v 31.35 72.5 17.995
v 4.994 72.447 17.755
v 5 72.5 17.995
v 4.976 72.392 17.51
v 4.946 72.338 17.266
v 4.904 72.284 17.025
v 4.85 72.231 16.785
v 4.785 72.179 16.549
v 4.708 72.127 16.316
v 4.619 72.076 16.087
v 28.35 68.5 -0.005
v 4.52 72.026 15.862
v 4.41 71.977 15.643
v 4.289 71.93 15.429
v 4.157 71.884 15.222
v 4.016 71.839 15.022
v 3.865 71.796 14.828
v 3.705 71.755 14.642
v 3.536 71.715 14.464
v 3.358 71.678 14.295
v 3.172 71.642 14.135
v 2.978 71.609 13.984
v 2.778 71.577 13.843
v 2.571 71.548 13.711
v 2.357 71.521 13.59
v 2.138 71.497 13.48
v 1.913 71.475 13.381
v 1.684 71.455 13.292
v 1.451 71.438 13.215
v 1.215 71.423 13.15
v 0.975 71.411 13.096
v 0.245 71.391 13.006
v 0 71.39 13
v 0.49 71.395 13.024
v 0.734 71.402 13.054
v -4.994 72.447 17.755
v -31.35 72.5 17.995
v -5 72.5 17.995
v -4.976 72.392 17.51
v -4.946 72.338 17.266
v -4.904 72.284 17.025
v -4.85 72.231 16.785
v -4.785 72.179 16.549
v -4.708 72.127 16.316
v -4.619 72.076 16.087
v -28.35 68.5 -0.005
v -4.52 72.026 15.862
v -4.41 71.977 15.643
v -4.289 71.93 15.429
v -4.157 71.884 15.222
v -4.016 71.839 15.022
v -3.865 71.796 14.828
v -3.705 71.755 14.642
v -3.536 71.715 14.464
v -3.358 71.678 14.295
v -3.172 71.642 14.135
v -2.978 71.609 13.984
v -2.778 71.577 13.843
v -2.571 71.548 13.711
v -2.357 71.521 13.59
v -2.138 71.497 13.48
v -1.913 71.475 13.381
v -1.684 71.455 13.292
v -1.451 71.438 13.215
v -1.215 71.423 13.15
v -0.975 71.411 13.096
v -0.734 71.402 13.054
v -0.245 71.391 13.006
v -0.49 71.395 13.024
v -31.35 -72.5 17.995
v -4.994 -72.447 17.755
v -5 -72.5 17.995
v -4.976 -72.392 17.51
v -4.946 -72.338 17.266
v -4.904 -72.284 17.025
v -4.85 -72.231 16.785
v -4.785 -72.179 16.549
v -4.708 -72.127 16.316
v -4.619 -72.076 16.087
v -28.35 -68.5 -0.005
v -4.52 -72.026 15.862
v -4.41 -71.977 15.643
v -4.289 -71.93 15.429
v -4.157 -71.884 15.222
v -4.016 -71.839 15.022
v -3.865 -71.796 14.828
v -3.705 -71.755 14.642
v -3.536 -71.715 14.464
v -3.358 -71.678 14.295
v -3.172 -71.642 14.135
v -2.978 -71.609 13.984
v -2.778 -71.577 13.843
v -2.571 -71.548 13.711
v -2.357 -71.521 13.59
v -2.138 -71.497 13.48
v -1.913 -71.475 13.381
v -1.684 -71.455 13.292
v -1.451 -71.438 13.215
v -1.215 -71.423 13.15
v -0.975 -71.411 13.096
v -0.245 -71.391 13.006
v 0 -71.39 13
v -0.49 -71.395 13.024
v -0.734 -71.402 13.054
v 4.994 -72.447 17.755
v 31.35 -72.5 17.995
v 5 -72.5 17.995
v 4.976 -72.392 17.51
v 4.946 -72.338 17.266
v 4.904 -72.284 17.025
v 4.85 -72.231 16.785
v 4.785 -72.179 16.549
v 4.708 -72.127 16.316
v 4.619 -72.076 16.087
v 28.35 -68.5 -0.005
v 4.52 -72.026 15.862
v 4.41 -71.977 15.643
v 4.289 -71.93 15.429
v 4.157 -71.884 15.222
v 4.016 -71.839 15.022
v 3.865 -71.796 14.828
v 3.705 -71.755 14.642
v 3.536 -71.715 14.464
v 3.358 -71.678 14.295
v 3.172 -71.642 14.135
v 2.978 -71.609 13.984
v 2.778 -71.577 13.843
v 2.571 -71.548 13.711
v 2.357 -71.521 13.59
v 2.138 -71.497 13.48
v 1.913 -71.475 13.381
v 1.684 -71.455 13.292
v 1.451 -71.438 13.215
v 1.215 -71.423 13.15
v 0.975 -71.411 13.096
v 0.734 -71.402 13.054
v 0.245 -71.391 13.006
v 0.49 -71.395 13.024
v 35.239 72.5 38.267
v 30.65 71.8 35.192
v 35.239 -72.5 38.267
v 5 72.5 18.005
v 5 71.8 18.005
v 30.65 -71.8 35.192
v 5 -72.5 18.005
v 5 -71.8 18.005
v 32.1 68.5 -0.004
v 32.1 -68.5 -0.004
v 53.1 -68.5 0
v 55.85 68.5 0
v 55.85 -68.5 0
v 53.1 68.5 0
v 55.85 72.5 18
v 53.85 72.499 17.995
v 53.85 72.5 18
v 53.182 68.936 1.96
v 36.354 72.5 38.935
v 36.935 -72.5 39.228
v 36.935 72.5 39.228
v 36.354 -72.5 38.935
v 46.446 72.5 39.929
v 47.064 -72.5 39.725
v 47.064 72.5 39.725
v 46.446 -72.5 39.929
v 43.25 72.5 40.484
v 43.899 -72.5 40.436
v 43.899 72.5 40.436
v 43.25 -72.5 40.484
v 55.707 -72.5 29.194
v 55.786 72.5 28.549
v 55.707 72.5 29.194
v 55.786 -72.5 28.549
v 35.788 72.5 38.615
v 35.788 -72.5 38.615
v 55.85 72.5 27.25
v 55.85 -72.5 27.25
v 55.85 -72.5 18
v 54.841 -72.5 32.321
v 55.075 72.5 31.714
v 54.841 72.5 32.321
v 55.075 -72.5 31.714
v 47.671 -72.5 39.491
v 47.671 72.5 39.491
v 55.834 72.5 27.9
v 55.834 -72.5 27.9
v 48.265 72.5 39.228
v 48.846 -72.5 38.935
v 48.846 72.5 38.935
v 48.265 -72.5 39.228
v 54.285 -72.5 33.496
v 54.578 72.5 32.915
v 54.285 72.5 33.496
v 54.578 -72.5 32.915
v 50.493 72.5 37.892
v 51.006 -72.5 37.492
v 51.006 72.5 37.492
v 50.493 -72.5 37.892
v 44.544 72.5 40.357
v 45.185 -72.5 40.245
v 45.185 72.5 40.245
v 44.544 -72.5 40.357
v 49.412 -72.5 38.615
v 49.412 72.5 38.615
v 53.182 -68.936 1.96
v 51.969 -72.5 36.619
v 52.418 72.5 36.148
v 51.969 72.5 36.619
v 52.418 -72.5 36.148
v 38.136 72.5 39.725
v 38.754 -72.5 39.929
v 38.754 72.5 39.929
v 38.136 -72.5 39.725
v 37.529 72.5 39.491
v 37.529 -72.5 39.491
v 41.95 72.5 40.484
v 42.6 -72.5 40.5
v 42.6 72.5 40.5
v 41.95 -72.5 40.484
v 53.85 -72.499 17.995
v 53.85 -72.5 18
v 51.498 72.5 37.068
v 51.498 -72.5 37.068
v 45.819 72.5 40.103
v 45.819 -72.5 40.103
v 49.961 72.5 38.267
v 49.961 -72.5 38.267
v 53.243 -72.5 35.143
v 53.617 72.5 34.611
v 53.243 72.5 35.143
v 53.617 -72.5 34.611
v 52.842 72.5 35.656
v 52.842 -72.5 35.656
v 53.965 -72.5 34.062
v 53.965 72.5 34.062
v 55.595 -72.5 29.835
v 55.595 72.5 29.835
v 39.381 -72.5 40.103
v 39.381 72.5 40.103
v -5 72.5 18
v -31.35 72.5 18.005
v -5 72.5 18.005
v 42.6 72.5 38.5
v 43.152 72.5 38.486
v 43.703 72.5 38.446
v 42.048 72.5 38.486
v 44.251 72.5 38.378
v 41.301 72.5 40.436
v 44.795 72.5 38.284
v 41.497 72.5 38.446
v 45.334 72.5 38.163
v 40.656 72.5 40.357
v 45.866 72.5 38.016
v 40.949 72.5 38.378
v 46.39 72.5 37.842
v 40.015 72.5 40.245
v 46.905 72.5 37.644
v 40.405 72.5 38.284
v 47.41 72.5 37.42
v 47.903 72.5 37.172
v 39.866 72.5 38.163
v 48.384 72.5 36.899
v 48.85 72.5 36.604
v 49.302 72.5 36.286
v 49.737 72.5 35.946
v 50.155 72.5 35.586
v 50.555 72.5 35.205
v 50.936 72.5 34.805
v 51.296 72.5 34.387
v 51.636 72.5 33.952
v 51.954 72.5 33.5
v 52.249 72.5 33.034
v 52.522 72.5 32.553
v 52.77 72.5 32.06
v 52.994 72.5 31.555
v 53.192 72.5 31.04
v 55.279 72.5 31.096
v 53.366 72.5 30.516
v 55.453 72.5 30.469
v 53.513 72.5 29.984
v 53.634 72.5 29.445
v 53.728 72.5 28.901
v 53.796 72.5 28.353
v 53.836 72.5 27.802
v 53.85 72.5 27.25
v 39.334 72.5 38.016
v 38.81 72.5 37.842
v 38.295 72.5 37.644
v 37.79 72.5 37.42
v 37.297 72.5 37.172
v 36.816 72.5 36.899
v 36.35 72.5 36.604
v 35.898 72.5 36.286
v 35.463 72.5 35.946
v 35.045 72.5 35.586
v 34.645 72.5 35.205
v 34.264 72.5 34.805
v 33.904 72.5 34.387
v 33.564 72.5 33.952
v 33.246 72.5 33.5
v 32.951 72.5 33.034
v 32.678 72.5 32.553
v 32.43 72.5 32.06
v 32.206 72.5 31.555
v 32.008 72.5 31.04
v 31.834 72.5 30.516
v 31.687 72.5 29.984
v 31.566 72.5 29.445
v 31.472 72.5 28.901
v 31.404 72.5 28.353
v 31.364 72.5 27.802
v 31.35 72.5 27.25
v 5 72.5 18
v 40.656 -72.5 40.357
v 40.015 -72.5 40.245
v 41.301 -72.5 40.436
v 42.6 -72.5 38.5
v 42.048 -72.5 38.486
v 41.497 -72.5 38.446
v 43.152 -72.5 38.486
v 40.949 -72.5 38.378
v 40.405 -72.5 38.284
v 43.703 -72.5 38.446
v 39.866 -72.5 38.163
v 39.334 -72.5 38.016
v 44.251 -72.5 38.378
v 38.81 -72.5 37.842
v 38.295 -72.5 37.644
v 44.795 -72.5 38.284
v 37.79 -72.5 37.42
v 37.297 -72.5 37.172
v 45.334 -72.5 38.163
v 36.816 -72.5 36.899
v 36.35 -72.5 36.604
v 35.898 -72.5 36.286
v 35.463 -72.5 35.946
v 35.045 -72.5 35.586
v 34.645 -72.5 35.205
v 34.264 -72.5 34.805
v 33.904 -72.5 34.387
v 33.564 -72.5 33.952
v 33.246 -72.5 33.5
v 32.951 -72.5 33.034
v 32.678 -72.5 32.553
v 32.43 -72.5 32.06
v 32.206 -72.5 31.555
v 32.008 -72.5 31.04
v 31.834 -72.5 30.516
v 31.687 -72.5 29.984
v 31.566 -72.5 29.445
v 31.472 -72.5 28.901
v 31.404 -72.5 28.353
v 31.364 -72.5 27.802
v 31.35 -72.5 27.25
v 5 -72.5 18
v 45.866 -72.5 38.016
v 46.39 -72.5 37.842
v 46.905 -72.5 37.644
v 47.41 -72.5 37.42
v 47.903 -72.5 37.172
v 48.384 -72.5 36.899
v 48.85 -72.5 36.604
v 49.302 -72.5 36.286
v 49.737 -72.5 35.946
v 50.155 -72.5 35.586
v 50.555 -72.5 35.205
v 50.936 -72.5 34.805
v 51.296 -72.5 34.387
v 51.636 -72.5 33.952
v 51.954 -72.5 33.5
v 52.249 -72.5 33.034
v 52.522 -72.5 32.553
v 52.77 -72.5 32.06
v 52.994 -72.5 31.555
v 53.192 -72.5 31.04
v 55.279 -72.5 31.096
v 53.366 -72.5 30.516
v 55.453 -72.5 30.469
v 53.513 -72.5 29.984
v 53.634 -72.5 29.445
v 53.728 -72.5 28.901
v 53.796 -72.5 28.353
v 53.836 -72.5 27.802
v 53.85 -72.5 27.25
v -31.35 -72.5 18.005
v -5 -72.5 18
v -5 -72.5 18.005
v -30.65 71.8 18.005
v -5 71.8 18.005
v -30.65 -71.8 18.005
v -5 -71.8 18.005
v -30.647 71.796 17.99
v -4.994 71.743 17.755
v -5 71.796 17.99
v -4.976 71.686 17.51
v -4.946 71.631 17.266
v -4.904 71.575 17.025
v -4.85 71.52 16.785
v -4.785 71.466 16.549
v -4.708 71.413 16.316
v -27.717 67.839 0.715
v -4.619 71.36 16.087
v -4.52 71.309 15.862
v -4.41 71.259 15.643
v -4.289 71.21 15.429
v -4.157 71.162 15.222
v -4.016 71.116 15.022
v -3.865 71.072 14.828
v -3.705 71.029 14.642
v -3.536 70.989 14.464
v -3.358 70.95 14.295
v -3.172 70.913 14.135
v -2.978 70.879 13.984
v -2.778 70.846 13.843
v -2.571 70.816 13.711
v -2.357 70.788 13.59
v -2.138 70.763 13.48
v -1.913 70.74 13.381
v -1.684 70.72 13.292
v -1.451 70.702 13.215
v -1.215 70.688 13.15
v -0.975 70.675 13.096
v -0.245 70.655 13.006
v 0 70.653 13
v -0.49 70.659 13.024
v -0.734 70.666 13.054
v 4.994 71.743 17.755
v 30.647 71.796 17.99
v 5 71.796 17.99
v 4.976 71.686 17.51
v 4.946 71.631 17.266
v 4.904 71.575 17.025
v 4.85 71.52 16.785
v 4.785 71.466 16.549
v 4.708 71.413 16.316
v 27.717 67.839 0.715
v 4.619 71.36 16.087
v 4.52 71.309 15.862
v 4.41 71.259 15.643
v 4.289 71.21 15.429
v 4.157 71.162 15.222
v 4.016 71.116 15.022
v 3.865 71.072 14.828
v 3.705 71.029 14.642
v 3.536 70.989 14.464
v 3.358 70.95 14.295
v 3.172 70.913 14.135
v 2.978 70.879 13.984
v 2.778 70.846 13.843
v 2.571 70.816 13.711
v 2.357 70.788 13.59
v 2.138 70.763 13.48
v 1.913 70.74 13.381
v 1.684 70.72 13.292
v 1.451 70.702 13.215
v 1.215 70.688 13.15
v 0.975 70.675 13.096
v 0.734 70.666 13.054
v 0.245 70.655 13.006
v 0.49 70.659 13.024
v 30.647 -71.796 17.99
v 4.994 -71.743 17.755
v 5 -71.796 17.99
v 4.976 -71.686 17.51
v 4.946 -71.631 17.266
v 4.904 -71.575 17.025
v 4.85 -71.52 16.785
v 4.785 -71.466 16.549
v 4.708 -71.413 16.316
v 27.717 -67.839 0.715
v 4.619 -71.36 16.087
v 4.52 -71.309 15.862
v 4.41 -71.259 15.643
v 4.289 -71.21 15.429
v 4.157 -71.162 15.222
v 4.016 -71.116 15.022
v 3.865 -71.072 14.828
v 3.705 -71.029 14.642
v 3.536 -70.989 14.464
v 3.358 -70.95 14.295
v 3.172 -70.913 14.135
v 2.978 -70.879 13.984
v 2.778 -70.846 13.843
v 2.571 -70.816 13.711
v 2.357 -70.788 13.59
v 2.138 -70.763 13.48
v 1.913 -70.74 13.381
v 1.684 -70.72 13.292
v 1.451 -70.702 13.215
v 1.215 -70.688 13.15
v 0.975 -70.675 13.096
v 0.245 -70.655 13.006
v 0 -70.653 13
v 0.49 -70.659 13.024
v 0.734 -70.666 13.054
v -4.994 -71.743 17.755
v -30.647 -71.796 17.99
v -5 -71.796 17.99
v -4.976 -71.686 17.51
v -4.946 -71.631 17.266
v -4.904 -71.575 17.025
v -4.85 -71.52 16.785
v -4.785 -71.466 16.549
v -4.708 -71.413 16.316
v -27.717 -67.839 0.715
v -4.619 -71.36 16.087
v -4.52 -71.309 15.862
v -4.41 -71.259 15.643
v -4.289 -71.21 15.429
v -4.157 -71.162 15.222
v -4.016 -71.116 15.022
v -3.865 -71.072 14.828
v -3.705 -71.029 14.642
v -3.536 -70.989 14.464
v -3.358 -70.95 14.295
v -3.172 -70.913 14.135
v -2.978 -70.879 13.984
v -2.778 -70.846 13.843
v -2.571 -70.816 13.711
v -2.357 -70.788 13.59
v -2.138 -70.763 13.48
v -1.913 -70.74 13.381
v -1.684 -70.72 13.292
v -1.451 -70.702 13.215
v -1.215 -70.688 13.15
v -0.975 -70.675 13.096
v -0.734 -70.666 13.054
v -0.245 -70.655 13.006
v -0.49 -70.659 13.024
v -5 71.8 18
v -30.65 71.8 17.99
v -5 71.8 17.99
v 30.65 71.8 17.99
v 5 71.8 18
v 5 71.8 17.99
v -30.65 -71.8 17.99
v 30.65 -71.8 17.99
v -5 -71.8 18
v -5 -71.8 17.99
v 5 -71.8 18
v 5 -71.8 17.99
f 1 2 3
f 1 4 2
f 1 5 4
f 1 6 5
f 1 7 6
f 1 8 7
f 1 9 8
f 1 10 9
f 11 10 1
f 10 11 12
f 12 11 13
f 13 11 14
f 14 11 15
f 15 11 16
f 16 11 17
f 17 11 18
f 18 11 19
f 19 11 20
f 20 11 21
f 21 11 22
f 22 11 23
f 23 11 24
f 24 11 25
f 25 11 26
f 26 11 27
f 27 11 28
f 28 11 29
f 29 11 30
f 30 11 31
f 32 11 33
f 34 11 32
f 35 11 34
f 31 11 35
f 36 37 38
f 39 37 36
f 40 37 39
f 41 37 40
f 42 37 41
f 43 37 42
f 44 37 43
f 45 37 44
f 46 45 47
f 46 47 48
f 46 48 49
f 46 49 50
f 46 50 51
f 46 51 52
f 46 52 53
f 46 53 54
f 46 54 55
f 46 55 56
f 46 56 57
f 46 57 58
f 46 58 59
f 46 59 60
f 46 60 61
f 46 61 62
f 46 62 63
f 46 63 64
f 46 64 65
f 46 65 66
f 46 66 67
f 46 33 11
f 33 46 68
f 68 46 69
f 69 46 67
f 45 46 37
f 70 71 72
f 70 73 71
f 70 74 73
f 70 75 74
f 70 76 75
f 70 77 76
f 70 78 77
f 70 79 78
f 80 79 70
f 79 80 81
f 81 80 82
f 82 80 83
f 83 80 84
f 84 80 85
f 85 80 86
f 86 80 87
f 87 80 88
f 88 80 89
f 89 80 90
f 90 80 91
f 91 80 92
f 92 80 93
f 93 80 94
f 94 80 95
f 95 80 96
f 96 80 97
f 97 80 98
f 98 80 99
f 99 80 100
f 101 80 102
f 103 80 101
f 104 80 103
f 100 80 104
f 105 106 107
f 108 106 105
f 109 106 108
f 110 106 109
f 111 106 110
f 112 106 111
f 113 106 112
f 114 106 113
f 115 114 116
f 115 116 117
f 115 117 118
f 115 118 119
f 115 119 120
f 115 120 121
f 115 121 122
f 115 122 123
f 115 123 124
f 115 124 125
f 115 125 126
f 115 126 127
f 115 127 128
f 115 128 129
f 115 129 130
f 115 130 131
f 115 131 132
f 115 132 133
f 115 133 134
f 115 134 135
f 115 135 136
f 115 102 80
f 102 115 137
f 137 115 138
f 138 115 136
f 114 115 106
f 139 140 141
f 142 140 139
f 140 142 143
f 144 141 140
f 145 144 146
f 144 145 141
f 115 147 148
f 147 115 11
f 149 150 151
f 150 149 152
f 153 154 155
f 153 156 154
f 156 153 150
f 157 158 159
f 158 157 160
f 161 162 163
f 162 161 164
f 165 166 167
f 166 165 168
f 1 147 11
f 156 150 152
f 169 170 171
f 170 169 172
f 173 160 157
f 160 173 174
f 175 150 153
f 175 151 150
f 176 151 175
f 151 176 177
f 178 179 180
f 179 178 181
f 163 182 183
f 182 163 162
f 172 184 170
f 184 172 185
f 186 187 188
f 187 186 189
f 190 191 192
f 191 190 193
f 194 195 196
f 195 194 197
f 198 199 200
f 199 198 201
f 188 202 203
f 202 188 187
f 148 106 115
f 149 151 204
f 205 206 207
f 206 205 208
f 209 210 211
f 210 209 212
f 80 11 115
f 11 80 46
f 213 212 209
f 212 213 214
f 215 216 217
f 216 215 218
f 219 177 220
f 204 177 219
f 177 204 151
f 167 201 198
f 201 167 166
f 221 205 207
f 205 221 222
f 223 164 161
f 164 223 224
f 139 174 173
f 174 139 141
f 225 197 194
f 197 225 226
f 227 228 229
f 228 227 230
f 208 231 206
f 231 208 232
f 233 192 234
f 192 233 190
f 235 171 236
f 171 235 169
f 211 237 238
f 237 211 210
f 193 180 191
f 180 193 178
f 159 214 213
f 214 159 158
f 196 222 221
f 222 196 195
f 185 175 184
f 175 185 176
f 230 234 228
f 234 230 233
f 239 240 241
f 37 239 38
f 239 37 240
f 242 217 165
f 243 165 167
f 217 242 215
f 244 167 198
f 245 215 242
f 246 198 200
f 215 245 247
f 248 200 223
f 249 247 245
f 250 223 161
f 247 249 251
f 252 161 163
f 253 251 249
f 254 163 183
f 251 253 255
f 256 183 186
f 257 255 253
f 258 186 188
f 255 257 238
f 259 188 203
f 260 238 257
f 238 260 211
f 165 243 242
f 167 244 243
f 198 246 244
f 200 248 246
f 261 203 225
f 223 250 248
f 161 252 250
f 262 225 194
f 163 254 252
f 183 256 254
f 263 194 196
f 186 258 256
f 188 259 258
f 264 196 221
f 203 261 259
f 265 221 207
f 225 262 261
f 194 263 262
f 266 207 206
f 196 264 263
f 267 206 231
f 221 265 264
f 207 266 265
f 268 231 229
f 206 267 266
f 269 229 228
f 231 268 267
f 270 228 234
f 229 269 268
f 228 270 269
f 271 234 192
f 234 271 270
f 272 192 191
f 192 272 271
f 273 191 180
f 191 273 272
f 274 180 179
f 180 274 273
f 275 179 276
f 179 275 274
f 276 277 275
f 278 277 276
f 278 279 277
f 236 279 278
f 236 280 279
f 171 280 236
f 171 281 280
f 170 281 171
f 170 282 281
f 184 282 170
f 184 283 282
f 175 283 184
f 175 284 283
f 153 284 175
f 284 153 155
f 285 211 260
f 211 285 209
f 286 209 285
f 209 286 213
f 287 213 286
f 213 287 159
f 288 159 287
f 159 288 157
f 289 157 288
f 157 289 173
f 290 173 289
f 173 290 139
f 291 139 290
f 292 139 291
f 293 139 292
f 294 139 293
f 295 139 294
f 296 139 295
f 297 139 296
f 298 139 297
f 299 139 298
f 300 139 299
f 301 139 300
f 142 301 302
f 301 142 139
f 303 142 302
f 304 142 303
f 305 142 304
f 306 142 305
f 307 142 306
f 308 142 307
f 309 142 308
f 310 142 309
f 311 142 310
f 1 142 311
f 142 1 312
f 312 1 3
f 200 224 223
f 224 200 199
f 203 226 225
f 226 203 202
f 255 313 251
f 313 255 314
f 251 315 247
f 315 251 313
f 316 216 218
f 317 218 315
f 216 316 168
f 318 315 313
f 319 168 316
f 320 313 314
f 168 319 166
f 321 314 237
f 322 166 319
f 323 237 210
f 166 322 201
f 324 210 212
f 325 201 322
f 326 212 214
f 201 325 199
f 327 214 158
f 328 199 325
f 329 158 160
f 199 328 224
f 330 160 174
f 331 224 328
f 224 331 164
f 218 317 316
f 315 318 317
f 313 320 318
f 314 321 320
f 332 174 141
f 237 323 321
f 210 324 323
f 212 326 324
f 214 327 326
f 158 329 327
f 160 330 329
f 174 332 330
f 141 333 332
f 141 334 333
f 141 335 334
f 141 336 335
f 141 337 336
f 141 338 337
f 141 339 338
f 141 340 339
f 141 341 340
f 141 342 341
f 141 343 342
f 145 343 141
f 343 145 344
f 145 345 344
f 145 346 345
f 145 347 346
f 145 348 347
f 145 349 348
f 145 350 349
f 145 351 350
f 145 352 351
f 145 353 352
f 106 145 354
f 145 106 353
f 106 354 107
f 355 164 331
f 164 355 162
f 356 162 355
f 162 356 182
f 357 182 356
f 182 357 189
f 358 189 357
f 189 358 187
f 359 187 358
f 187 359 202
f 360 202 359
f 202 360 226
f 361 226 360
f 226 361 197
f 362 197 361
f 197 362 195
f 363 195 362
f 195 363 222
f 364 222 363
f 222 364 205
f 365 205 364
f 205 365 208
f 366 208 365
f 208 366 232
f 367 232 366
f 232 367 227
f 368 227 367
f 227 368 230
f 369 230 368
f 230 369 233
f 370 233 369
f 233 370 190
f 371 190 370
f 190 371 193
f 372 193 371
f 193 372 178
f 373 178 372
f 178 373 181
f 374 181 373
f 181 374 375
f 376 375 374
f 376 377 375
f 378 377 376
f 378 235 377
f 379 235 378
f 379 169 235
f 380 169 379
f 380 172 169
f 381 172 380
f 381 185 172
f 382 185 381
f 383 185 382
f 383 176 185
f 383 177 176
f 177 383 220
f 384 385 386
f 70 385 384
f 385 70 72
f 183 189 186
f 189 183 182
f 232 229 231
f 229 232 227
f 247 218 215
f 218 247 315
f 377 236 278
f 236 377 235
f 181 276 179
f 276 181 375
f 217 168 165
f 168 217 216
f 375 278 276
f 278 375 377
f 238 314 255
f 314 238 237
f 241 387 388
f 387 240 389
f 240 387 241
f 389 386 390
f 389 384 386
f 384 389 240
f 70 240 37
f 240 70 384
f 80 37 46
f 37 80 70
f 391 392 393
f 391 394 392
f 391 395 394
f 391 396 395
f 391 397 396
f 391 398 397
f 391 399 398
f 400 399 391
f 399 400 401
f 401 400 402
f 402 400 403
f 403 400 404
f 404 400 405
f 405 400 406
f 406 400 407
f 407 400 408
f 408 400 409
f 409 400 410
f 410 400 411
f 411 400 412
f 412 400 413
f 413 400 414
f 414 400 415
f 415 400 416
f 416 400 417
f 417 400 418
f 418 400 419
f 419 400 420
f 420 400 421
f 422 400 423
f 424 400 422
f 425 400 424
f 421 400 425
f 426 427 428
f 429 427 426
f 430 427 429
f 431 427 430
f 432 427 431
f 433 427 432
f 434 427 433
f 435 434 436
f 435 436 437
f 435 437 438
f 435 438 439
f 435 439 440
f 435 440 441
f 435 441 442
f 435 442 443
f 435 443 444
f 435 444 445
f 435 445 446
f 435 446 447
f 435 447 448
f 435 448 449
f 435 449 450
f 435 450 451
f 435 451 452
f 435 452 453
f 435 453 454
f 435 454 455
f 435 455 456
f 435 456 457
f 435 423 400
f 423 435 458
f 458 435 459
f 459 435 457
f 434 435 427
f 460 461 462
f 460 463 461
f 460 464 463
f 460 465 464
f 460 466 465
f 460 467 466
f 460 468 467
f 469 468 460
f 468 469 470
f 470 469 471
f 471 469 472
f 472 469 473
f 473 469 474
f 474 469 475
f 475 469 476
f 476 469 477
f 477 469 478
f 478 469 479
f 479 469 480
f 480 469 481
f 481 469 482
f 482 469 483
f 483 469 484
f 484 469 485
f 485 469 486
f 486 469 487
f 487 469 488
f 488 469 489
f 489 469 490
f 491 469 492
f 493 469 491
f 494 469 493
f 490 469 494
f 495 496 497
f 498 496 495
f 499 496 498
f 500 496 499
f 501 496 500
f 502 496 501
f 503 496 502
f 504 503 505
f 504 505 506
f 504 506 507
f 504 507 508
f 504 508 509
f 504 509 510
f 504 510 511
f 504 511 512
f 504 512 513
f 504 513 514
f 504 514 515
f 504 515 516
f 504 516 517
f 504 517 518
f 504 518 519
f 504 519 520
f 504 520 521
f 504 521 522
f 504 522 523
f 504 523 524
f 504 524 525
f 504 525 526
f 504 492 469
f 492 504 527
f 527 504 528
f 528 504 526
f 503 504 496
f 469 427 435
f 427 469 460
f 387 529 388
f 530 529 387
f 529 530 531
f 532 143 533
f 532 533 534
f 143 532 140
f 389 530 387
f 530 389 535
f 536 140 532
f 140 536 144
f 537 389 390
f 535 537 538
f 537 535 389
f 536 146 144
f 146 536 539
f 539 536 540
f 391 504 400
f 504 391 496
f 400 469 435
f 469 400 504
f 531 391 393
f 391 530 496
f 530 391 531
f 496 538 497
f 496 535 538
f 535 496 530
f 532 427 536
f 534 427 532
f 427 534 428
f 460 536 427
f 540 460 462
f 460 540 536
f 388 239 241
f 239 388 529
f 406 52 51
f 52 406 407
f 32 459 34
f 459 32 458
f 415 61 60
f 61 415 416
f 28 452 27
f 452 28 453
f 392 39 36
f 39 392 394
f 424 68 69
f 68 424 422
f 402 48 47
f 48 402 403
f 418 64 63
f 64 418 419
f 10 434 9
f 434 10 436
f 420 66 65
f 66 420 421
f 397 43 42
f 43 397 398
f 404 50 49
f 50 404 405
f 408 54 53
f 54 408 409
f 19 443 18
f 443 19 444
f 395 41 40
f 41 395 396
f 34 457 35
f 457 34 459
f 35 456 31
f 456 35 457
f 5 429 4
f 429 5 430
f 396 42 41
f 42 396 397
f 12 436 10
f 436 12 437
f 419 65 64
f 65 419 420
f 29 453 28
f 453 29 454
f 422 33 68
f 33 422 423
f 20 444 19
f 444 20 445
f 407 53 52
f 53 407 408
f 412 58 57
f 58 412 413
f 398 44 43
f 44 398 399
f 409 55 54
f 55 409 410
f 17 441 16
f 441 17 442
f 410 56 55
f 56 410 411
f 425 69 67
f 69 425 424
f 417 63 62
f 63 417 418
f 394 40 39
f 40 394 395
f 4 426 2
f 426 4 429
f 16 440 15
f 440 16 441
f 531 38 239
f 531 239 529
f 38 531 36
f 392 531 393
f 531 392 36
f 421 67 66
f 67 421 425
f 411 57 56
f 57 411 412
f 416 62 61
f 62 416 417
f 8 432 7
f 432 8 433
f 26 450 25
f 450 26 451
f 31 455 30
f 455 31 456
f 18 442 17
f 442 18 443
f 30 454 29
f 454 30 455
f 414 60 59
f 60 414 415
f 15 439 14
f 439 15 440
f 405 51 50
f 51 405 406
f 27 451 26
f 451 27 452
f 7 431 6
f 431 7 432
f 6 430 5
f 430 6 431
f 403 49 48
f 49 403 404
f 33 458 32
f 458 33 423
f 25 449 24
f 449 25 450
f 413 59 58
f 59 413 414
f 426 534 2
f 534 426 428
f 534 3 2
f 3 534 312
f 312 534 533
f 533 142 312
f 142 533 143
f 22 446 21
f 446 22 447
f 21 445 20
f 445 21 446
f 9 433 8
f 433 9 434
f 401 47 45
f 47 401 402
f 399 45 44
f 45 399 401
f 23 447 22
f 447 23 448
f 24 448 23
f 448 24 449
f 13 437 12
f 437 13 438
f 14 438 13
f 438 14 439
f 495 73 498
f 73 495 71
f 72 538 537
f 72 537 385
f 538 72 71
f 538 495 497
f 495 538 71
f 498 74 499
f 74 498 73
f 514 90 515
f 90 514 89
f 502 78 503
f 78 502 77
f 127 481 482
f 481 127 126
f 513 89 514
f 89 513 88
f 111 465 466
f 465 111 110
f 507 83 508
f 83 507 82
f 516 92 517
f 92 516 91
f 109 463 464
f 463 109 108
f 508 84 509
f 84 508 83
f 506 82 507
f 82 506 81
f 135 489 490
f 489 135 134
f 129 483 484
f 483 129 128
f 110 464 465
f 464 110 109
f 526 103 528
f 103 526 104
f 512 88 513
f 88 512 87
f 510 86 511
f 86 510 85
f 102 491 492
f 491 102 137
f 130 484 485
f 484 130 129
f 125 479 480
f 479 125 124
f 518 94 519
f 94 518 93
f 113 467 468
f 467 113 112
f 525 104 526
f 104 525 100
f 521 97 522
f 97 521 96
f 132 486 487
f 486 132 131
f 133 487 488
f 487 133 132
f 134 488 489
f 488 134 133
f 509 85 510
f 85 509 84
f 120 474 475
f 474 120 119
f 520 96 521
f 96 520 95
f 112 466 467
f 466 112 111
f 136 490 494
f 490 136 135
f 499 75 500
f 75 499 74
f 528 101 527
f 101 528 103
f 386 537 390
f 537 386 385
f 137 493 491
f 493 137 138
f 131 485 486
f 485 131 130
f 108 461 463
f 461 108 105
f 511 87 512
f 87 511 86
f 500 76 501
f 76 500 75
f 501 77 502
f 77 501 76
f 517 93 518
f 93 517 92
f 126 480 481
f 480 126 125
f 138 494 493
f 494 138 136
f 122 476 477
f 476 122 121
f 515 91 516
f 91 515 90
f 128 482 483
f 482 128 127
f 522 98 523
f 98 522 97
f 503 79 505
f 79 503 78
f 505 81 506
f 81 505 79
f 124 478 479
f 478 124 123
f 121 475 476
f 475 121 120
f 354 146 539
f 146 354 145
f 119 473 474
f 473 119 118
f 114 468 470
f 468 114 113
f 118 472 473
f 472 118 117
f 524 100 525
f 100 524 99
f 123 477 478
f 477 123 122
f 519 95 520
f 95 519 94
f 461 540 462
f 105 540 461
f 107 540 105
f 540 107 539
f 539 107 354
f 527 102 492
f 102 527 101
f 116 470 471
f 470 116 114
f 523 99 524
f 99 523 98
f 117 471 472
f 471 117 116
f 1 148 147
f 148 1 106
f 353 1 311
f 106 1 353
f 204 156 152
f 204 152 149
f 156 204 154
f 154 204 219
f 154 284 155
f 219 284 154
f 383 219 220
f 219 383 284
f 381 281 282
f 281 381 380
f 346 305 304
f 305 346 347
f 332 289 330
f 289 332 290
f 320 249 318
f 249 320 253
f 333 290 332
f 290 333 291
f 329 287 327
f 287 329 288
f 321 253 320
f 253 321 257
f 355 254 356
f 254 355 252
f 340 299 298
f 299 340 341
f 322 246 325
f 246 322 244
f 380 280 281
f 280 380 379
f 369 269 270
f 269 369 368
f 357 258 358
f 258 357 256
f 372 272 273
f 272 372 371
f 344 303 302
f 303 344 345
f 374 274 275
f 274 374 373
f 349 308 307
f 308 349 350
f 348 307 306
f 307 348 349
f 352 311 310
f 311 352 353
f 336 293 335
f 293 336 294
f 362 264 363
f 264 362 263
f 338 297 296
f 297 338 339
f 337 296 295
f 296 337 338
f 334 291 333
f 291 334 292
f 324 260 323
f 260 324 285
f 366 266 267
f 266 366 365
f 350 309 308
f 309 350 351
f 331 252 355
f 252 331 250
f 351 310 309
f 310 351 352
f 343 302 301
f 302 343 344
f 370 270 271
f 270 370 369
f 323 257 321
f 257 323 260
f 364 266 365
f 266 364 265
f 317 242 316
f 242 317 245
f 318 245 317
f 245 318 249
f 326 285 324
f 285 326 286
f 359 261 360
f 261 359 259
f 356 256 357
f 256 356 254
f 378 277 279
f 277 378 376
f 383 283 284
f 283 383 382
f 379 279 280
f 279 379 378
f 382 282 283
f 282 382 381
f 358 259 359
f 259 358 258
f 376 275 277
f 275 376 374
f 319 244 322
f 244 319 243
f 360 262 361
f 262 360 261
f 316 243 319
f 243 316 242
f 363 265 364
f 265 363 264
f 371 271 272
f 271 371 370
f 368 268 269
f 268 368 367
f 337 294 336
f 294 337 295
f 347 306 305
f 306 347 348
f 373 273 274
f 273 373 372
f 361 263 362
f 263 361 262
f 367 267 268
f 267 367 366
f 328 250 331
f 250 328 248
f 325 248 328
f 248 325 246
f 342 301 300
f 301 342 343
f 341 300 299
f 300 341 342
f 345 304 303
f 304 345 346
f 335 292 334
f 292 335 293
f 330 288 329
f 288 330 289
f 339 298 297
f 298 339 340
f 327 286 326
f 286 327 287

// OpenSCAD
// Parametric Power Strip Tray
// Designed by BikeCyclist
// https://www.thingiverse.com/thing:3095108
// V1: 11 September 2018

// Inner Width of the Tray at the Bottom - Size to match your Power Strip
w_bottom_inner = 56;

// Inner Width of the Tray at Middle Height - Size to match your Power Strip
w_middle_inner = 62;

// Inner Width of the Clamp at the Top - Size to match your Board for Mounting
w_clamp_top = 22.5;

// Inner Width of the Clamp at the Bottom - slightly smaller than Top Width for Springiness
w_clamp_bottom = 21;

// Inner Length of the Tray at the Bottom - Size to match your Power Strip
l_bottom = 137;

// Inner Length of the Tray at Middle Height - Size to match your Power Strip
l_middle = 145;

// Height of Middle Height - Size to match your Power Strip
h_middle = 18;

h_total = 2 * h_middle;

// Wall Thickness for Tray
th_wall = 0.7;

// Wall Thickness for Hook
th_wall_hook = 2;

w_bottom = w_bottom_inner + th_wall;
w_middle = w_middle_inner + th_wall;

// Controls Brim for Printing
STL_has_brims = false; //[false, true]

// Diameter of Extension Cord Cable
dia_cable = 10;

// Number of Facets
$fn = 128;

// Small Distance to ensure Proper Meshing
epsilon = 0.01;

rotate ([0, 0, 180])
{
    if (STL_has_brims)
    {
        for (i = [-1,1], j = [-1, 1])
            translate ([-i * w_bottom/2, j * l_bottom/2, 0])
                cylinder (d = 30, h = 0.3);

        hull ()
            for (j = [-1, 1])
                translate ([-w_bottom/2 - w_clamp_bottom, j * l_bottom/2, 0])
                    cylinder (d = 30, h = 0.3);
            
        *for (j = [-1, 1])
                translate ([-w_bottom/2 - w_clamp_bottom , j * l_bottom/2 - 0.5, 10])
                    cube ([13, 0.5, 20], center = true);
    }

    difference ()
    {
        union ()
        {
            hull ()
            {
                hook ();
                
                difference ()
                {
                    tray_shape ();
                    
                    translate ([- dia_cable/2, -l_middle/2 - epsilon, -epsilon])
                        cube ([w_middle, l_middle + 2 * epsilon, h_middle + 2 * epsilon]);
                }
            }
            tray_shape ();
        }
        
        tray_cutouts ();
        hook_cutouts ();
    }
}

module hook ()
{
    translate ([-(w_middle + w_clamp_top)/2, 0, 0])    
    {
        hull()
        {
            translate ([0, 0, h_middle + epsilon/2])
                cube ([2 * th_wall_hook + w_clamp_top, l_middle, epsilon], center = true);
            
            translate ([0, 0, h_total/2 - (2 * th_wall_hook - w_clamp_top)/2])
                rotate ([90, 0, 0])
                    difference ()
                    {
                        cylinder (d = 2 * th_wall_hook + w_clamp_top, h = l_middle, center = true);
                        translate ([0, -(2 * th_wall_hook + w_clamp_top)/2, 0])
                            cube ([(2 * th_wall_hook + w_clamp_top), (2 * th_wall_hook + w_clamp_top), l_middle + 2 * epsilon], center = true);
                    }
        }
        
        hull()
        {
            translate ([0, 0, h_middle + epsilon/2])
                cube ([2 * th_wall_hook + w_clamp_top, l_middle, epsilon], center = true);
            
            translate ([0, 0, epsilon/2])
                cube ([2 * th_wall_hook + w_clamp_top, l_bottom, epsilon], center = true);
        }
    }
}

module hook_cutouts ()
{
    translate ([-(w_middle + w_clamp_top)/2, 0, 0])    
        union ()
        {
            hull ()
            {
                translate ([0, -epsilon, h_middle])
                    cube ([w_clamp_top, l_middle + 2 * epsilon, epsilon], center = true);
                
                translate ([0, 0, -epsilon/2])
                    cube ([w_clamp_bottom, l_middle, epsilon], center = true);
            }
            
            hull ()
            {
                translate ([0, 0, h_middle])
                    cube ([w_clamp_top, l_middle, epsilon], center = true);
                
                translate ([0, 0, h_total/2 - (2 * th_wall_hook - w_clamp_top)/2])
                    rotate ([90, 0, 0])
                        cylinder (d = w_clamp_top, h = l_middle + 4 * epsilon, center = true);
            }
        }
}


module tray ()
{
    difference ()
    {
        tray_shape ();
        
    }
}

module tray_cutouts ()
{
    translate ([0, 0, th_wall + 2 * epsilon])
        resize ([w_middle - 2 * th_wall, l_middle - 2 * th_wall, h_middle - th_wall])
                tray_shape ();
        
    translate ([0, 0, h_middle - epsilon + h_total/2])
        resize ([w_middle - 2 * th_wall, l_middle - 2 * th_wall, h_total])
            cube ([1, 1, 1], center = true);
    
    translate ([0, -l_bottom/2 + th_wall + epsilon, h_middle])
        rotate ([90, 0, 0])
            cylinder (d = dia_cable, h = l_bottom/2);
    
    translate ([0, -(-l_bottom/2 + th_wall + epsilon), h_middle])
        rotate ([-90, 0, 0])
            cylinder (d = dia_cable, h = l_bottom/2);
}


module tray_shape ()
hull ()
{
    cube ([w_bottom, l_bottom, epsilon], center = true);
    
    translate ([0, 0, h_middle])
        cube ([w_middle, l_middle, epsilon], center = true);
}
